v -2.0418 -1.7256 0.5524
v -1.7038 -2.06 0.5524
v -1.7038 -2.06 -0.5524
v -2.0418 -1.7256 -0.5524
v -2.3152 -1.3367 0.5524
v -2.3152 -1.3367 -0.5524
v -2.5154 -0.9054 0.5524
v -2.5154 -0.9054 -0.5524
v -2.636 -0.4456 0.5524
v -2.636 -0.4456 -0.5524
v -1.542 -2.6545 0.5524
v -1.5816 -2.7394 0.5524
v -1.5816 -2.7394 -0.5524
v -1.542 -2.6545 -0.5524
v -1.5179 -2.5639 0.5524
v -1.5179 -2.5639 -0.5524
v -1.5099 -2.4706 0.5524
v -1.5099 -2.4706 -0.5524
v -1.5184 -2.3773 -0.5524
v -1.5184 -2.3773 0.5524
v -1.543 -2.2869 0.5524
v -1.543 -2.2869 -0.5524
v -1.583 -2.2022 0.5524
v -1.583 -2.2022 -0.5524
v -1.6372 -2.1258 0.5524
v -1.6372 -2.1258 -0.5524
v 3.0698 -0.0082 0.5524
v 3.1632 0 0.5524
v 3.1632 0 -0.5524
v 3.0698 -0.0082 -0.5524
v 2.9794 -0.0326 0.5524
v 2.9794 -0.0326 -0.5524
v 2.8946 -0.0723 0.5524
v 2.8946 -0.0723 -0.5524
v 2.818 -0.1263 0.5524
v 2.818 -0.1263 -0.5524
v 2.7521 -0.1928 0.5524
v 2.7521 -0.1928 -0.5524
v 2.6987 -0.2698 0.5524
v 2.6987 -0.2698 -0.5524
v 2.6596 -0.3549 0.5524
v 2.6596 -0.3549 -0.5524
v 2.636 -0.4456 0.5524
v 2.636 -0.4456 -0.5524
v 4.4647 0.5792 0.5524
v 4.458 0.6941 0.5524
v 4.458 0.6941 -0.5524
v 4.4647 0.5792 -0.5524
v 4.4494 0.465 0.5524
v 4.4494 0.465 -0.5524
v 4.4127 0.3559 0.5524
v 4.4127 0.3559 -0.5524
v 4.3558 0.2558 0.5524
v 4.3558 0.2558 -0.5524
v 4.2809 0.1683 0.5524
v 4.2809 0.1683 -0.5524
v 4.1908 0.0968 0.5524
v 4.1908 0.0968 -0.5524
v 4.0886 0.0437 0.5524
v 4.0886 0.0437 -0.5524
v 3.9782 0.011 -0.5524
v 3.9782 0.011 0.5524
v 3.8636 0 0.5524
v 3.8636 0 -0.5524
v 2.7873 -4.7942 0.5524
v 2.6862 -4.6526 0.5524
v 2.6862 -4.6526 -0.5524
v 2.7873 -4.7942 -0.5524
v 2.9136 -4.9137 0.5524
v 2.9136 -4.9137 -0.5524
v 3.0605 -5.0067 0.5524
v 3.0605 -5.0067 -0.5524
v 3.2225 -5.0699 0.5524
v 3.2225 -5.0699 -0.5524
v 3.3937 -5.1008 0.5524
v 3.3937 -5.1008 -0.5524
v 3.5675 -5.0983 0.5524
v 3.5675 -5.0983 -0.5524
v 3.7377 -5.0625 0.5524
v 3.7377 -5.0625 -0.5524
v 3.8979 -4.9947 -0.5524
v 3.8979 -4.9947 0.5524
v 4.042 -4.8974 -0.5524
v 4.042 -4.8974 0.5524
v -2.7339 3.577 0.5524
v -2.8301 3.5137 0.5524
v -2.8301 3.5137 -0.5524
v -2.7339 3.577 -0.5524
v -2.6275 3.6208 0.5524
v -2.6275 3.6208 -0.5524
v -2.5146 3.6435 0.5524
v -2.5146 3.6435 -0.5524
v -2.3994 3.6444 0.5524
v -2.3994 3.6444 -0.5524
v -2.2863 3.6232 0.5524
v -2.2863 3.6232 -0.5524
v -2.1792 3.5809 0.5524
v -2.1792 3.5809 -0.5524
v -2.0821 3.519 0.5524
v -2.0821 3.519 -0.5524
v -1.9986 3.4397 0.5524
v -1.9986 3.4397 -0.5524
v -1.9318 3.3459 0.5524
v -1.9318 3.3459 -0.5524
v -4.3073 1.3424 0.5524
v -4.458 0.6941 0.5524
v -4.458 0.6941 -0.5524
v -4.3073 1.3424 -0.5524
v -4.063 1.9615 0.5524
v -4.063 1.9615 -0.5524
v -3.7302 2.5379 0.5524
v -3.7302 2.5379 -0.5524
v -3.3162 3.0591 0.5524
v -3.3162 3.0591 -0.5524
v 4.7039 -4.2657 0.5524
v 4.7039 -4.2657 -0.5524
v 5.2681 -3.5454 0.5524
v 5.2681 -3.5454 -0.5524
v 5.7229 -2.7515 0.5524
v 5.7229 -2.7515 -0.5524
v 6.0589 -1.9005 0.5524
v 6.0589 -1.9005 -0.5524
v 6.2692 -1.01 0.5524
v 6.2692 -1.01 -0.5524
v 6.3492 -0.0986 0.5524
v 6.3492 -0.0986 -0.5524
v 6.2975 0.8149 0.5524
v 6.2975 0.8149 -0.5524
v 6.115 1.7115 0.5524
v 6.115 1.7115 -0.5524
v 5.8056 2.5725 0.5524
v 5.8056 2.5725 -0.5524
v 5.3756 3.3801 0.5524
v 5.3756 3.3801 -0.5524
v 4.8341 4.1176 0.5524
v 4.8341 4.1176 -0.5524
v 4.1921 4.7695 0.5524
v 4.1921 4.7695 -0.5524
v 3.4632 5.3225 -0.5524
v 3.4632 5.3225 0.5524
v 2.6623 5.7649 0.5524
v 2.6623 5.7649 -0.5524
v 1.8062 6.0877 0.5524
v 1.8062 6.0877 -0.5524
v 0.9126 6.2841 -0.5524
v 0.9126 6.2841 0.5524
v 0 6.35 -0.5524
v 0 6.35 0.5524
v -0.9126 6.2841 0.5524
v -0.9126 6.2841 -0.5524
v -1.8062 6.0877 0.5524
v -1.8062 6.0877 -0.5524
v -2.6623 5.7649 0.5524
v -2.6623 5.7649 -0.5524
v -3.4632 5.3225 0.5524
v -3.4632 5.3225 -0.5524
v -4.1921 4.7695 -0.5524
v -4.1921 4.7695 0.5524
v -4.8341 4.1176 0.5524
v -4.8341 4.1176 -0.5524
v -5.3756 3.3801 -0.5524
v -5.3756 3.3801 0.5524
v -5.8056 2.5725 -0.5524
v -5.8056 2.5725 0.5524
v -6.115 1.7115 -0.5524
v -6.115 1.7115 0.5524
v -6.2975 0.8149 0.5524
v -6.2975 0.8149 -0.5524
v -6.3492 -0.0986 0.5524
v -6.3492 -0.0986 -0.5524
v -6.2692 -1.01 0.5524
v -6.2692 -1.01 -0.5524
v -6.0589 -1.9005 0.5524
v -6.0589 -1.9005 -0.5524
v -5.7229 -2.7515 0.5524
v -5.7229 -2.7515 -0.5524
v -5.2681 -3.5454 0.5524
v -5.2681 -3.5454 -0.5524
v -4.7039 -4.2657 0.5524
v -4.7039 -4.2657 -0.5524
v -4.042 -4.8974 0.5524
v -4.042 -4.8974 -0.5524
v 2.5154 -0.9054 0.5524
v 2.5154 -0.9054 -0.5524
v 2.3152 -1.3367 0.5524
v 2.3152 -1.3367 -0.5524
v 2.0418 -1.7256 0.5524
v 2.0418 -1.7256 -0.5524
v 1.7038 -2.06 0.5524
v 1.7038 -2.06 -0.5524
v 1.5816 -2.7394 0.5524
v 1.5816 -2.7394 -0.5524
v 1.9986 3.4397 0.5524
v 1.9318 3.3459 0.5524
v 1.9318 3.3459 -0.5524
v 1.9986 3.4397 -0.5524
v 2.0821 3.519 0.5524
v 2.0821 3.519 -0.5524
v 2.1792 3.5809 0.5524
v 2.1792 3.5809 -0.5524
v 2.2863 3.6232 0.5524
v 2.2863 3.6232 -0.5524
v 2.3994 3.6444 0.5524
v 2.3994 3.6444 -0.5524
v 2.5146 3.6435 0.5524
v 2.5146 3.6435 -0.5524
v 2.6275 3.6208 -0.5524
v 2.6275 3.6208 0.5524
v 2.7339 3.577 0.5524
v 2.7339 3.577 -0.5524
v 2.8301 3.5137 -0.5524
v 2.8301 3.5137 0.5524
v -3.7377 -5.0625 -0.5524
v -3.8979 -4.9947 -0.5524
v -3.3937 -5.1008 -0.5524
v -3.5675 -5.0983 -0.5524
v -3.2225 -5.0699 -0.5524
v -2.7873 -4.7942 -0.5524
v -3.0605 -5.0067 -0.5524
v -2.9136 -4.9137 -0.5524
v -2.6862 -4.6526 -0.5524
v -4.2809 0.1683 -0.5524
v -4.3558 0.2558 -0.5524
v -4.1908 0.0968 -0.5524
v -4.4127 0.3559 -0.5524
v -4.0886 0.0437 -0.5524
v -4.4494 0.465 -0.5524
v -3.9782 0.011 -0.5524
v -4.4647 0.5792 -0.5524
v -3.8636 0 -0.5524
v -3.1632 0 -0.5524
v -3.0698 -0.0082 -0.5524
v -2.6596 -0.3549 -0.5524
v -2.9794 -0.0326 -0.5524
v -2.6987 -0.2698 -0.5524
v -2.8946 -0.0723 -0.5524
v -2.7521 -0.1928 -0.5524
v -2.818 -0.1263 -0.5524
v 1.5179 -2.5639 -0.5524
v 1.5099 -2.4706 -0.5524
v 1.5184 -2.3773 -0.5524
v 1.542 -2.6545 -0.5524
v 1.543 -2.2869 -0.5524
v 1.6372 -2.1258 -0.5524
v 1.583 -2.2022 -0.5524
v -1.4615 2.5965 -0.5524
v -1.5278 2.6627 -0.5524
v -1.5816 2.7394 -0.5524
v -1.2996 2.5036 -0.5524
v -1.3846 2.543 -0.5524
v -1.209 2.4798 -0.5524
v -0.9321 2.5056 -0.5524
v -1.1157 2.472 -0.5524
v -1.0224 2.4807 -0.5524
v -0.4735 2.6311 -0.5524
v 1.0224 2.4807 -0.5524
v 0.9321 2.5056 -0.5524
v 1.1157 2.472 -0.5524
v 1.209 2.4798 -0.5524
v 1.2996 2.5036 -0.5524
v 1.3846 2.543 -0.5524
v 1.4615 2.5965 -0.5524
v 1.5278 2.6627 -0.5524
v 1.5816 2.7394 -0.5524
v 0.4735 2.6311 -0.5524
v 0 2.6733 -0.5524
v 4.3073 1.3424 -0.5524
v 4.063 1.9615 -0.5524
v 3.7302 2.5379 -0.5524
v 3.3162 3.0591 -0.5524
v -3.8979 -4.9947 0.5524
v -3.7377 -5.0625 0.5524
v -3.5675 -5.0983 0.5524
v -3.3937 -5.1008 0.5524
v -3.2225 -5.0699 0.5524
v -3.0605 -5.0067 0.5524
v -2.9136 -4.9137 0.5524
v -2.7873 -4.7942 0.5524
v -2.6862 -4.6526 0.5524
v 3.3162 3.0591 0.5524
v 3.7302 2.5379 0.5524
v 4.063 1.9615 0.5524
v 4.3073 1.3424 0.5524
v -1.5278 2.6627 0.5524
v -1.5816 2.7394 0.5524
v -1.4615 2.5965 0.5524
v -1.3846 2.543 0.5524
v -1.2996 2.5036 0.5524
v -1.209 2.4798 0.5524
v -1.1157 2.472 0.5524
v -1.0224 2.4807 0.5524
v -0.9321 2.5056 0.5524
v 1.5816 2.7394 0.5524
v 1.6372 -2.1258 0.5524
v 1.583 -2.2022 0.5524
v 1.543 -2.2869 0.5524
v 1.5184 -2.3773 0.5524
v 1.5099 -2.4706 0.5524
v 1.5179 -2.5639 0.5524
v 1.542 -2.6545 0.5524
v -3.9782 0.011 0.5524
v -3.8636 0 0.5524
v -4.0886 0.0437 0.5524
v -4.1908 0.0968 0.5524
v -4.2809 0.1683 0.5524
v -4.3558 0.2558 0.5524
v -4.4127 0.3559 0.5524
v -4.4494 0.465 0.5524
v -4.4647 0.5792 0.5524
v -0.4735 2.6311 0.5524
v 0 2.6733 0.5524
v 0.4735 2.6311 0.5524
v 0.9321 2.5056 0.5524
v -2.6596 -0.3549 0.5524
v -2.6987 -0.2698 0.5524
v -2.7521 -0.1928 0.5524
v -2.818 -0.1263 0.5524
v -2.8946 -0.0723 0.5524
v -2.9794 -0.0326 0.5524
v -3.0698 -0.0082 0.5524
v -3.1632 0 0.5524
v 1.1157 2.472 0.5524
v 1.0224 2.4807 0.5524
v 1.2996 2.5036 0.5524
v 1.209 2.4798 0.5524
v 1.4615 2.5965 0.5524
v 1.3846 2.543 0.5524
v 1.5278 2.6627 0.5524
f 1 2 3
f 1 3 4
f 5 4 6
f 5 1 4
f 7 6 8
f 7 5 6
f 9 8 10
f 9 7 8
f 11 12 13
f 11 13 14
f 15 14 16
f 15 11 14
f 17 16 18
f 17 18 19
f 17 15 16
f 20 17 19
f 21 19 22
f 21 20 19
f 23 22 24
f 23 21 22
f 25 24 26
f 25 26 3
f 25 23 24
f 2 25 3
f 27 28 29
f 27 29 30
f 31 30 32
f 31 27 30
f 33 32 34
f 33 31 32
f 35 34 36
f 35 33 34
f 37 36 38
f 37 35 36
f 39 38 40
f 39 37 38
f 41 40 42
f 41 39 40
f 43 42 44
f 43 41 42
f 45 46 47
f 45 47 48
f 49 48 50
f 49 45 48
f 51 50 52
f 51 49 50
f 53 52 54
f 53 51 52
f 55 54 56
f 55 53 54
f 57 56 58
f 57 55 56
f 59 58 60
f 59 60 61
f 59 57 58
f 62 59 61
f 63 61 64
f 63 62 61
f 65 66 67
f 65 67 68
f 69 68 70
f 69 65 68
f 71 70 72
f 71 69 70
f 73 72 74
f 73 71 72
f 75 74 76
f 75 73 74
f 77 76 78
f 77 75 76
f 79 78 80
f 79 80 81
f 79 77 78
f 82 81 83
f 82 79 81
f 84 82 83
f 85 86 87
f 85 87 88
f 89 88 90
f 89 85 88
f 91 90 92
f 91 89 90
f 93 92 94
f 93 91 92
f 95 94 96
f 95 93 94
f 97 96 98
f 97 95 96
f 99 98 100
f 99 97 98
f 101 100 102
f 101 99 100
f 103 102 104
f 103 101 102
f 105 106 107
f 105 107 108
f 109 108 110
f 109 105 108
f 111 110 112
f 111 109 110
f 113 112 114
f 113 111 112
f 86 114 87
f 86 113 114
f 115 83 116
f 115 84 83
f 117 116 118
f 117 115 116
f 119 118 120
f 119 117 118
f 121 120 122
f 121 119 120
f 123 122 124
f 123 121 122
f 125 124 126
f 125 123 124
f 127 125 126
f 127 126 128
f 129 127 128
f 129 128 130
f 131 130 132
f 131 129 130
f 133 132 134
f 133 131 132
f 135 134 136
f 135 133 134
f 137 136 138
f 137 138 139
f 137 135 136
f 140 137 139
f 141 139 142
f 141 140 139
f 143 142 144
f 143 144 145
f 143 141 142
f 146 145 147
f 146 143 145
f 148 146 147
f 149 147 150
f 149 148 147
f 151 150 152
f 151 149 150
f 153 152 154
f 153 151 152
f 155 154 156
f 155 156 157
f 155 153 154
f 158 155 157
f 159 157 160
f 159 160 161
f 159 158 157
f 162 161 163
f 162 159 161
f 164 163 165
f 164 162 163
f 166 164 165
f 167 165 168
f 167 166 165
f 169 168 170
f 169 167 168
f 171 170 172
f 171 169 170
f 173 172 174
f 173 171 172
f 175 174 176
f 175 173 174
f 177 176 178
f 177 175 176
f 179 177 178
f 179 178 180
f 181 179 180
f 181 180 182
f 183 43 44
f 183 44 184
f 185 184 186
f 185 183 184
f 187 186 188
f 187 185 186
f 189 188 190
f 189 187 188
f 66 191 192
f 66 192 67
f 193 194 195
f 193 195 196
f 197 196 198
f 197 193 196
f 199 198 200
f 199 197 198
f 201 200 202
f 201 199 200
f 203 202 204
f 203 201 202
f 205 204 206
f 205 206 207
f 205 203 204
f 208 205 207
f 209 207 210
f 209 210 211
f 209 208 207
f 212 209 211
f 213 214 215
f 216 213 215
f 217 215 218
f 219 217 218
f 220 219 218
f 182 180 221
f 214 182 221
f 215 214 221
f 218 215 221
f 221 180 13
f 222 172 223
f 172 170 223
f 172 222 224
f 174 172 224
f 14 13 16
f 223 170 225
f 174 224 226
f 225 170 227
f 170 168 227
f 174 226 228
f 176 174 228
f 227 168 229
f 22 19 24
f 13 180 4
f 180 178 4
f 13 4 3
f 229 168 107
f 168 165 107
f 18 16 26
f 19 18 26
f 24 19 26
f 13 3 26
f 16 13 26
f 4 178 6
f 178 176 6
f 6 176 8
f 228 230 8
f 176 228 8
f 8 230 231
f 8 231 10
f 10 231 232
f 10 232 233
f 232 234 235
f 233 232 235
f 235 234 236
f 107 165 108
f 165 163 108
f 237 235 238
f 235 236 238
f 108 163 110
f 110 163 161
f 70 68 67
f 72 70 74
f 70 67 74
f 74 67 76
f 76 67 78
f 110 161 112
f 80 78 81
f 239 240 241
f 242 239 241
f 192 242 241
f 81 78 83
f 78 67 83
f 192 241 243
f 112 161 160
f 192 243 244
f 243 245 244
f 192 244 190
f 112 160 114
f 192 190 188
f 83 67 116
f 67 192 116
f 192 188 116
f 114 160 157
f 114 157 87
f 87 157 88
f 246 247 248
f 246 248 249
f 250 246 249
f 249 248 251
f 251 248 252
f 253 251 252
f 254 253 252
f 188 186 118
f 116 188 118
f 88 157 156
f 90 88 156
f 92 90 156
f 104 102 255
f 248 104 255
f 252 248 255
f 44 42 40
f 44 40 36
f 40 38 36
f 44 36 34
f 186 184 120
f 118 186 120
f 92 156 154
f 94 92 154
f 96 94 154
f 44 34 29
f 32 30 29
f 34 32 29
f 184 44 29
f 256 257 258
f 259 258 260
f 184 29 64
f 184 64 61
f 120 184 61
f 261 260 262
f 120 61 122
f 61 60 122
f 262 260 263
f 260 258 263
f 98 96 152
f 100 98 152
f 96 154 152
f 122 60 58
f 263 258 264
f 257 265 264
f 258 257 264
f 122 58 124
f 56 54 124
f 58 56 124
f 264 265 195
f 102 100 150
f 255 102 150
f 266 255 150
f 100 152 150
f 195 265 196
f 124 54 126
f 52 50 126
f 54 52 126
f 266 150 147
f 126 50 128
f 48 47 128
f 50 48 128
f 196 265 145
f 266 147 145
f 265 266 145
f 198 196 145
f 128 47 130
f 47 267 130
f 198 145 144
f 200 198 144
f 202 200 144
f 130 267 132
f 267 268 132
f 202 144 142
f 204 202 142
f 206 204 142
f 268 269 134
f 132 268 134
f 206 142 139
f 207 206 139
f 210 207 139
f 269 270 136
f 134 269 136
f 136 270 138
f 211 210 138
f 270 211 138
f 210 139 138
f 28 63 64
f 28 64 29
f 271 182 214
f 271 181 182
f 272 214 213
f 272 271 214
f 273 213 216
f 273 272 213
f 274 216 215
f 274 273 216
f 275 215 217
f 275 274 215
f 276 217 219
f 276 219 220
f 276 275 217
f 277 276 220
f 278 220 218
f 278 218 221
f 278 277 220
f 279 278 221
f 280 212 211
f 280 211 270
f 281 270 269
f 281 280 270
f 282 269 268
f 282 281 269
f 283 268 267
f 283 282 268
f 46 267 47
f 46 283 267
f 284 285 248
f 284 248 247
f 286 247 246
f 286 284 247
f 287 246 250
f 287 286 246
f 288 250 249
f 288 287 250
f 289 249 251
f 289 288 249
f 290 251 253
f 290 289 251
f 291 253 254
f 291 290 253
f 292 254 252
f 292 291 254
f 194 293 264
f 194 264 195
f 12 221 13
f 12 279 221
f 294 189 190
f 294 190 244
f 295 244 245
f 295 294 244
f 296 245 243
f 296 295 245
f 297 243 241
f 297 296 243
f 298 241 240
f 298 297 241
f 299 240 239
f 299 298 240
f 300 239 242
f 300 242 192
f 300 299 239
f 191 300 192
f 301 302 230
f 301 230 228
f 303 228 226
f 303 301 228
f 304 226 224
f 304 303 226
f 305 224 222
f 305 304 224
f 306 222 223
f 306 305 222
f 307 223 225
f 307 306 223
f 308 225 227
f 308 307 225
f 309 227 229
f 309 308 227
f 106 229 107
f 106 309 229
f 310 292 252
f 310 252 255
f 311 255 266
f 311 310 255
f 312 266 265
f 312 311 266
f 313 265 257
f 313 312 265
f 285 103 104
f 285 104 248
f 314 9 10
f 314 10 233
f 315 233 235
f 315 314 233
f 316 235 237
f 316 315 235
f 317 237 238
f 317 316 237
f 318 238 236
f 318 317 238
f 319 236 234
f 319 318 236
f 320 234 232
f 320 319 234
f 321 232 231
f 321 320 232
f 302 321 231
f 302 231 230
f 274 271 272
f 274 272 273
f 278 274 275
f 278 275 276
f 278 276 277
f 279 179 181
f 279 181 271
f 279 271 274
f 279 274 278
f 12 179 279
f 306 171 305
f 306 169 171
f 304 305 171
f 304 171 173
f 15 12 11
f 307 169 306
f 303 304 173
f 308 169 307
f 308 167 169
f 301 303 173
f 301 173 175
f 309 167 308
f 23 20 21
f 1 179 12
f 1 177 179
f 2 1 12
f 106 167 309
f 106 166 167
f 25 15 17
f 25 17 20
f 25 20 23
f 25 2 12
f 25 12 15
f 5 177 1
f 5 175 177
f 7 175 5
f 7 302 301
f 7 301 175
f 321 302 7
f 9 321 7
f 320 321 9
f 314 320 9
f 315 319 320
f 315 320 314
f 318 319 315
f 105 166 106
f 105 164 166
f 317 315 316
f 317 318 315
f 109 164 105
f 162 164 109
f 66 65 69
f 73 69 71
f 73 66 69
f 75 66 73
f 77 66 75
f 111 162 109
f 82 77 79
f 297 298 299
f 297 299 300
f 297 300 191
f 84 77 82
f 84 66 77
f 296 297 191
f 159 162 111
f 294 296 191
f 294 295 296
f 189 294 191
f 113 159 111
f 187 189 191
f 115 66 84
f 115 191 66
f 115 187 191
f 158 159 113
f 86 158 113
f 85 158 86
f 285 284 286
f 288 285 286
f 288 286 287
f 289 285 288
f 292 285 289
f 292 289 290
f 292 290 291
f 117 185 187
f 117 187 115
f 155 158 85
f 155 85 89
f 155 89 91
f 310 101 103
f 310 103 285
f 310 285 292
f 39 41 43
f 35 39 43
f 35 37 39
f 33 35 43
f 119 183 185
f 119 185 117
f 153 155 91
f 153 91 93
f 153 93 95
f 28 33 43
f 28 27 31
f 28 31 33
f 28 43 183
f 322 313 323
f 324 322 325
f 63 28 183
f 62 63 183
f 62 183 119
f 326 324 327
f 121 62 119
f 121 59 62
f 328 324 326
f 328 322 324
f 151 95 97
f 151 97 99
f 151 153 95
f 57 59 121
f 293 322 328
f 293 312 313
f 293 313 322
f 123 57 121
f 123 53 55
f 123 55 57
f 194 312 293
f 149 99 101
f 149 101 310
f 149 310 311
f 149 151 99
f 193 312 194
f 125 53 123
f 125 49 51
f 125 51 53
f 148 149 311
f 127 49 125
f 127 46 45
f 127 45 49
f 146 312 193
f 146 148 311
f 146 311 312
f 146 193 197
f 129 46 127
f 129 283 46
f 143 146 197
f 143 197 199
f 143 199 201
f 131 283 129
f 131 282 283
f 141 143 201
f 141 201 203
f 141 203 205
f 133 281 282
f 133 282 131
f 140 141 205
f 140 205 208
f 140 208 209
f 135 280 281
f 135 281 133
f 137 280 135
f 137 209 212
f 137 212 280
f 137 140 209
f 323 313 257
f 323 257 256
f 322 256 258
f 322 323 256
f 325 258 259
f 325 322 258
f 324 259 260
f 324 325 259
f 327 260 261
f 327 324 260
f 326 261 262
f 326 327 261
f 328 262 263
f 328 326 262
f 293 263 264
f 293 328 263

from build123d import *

# Parameters (mm, degrees)
BOSS_EXTRUDE1_DEPTH      = 0.55245
BOSS_EXTRUDE1_DEPTH_BACK = 0.55245


with BuildPart() as part:
    # Sketch1 → Boss-Extrude1 (new, two sides: drawn at the far end of the back side and taken through both)
    with BuildSketch(Plane.XY.offset(-BOSS_EXTRUDE1_DEPTH_BACK)):
        with BuildLine():
            Line((-2.686207619, -4.652648077), (-1.581575189, -2.739368583))
            ThreePointArc((-1.581575189, -2.739368583), (-1.518398027, -2.377324451), (-1.703844152, -2.060027992))
            ThreePointArc((-1.703844152, -2.060027992), (-2.315189002, -1.336675019), (-2.635958642, -0.445558366))
            ThreePointArc((-2.635958642, -0.445558366), (-2.818022364, -0.126309053), (-3.163150378, 0))
            Line((-3.163150378, 0), (-3.863567646, 0))
            ThreePointArc((-3.863567646, 0), (-4.32048273, 0.210277956), (-4.457962671, 0.694103832))
            ThreePointArc((-4.457962671, 0.694103832), (-3.907225167, 2.255837494), (-2.830092898, 3.513656997))
            ThreePointArc((-2.830092898, 3.513656997), (-2.342347424, 3.636508824), (-1.931783823, 3.345947731))
            Line((-1.931783823, 3.345947731), (-1.581575189, 2.739368583))
            ThreePointArc((-1.581575189, 2.739368583), (-1.299624349, 2.503633488), (-0.932114488, 2.505586319))
            ThreePointArc((-0.932114488, 2.505586319), (-1.7e-08, 2.67335), (0.932114457, 2.505586331))
            ThreePointArc((0.932114457, 2.505586331), (1.299624333, 2.503633482), (1.581575189, 2.739368583))
            Line((1.581575189, 2.739368583), (1.931783823, 3.345947731))
            ThreePointArc((1.931783823, 3.345947731), (2.342347445, 3.636508828), (2.830092931, 3.51365697))
            ThreePointArc((2.830092931, 3.51365697), (3.907225174, 2.255837482), (4.457962669, 0.694103846))
            ThreePointArc((4.457962669, 0.694103846), (4.320482735, 0.210277961), (3.863567646, 0))
            Line((3.863567646, 0), (3.163150378, 0))
            ThreePointArc((3.163150378, 0), (2.818022373, -0.126309046), (2.635958646, -0.445558343))
            ThreePointArc((2.635958646, -0.445558343), (2.315189019, -1.33667499), (1.703844185, -2.060027965))
            ThreePointArc((1.703844185, -2.060027965), (1.518398031, -2.377324429), (1.581575189, -2.739368583))
            Line((1.581575189, -2.739368583), (2.686207619, -4.652648077))
            ThreePointArc((2.686207619, -4.652648077), (3.307353322, -5.089462883), (4.042024336, -4.897401277))
            ThreePointArc((4.042024336, -4.897401277), (-2e-08, 6.35), (-4.042024306, -4.897401302))
            ThreePointArc((-4.042024306, -4.897401302), (-3.307353303, -5.08946288), (-2.686207619, -4.652648077))
        make_face()
    extrude(amount=BOSS_EXTRUDE1_DEPTH + BOSS_EXTRUDE1_DEPTH_BACK)


solid = part.part
